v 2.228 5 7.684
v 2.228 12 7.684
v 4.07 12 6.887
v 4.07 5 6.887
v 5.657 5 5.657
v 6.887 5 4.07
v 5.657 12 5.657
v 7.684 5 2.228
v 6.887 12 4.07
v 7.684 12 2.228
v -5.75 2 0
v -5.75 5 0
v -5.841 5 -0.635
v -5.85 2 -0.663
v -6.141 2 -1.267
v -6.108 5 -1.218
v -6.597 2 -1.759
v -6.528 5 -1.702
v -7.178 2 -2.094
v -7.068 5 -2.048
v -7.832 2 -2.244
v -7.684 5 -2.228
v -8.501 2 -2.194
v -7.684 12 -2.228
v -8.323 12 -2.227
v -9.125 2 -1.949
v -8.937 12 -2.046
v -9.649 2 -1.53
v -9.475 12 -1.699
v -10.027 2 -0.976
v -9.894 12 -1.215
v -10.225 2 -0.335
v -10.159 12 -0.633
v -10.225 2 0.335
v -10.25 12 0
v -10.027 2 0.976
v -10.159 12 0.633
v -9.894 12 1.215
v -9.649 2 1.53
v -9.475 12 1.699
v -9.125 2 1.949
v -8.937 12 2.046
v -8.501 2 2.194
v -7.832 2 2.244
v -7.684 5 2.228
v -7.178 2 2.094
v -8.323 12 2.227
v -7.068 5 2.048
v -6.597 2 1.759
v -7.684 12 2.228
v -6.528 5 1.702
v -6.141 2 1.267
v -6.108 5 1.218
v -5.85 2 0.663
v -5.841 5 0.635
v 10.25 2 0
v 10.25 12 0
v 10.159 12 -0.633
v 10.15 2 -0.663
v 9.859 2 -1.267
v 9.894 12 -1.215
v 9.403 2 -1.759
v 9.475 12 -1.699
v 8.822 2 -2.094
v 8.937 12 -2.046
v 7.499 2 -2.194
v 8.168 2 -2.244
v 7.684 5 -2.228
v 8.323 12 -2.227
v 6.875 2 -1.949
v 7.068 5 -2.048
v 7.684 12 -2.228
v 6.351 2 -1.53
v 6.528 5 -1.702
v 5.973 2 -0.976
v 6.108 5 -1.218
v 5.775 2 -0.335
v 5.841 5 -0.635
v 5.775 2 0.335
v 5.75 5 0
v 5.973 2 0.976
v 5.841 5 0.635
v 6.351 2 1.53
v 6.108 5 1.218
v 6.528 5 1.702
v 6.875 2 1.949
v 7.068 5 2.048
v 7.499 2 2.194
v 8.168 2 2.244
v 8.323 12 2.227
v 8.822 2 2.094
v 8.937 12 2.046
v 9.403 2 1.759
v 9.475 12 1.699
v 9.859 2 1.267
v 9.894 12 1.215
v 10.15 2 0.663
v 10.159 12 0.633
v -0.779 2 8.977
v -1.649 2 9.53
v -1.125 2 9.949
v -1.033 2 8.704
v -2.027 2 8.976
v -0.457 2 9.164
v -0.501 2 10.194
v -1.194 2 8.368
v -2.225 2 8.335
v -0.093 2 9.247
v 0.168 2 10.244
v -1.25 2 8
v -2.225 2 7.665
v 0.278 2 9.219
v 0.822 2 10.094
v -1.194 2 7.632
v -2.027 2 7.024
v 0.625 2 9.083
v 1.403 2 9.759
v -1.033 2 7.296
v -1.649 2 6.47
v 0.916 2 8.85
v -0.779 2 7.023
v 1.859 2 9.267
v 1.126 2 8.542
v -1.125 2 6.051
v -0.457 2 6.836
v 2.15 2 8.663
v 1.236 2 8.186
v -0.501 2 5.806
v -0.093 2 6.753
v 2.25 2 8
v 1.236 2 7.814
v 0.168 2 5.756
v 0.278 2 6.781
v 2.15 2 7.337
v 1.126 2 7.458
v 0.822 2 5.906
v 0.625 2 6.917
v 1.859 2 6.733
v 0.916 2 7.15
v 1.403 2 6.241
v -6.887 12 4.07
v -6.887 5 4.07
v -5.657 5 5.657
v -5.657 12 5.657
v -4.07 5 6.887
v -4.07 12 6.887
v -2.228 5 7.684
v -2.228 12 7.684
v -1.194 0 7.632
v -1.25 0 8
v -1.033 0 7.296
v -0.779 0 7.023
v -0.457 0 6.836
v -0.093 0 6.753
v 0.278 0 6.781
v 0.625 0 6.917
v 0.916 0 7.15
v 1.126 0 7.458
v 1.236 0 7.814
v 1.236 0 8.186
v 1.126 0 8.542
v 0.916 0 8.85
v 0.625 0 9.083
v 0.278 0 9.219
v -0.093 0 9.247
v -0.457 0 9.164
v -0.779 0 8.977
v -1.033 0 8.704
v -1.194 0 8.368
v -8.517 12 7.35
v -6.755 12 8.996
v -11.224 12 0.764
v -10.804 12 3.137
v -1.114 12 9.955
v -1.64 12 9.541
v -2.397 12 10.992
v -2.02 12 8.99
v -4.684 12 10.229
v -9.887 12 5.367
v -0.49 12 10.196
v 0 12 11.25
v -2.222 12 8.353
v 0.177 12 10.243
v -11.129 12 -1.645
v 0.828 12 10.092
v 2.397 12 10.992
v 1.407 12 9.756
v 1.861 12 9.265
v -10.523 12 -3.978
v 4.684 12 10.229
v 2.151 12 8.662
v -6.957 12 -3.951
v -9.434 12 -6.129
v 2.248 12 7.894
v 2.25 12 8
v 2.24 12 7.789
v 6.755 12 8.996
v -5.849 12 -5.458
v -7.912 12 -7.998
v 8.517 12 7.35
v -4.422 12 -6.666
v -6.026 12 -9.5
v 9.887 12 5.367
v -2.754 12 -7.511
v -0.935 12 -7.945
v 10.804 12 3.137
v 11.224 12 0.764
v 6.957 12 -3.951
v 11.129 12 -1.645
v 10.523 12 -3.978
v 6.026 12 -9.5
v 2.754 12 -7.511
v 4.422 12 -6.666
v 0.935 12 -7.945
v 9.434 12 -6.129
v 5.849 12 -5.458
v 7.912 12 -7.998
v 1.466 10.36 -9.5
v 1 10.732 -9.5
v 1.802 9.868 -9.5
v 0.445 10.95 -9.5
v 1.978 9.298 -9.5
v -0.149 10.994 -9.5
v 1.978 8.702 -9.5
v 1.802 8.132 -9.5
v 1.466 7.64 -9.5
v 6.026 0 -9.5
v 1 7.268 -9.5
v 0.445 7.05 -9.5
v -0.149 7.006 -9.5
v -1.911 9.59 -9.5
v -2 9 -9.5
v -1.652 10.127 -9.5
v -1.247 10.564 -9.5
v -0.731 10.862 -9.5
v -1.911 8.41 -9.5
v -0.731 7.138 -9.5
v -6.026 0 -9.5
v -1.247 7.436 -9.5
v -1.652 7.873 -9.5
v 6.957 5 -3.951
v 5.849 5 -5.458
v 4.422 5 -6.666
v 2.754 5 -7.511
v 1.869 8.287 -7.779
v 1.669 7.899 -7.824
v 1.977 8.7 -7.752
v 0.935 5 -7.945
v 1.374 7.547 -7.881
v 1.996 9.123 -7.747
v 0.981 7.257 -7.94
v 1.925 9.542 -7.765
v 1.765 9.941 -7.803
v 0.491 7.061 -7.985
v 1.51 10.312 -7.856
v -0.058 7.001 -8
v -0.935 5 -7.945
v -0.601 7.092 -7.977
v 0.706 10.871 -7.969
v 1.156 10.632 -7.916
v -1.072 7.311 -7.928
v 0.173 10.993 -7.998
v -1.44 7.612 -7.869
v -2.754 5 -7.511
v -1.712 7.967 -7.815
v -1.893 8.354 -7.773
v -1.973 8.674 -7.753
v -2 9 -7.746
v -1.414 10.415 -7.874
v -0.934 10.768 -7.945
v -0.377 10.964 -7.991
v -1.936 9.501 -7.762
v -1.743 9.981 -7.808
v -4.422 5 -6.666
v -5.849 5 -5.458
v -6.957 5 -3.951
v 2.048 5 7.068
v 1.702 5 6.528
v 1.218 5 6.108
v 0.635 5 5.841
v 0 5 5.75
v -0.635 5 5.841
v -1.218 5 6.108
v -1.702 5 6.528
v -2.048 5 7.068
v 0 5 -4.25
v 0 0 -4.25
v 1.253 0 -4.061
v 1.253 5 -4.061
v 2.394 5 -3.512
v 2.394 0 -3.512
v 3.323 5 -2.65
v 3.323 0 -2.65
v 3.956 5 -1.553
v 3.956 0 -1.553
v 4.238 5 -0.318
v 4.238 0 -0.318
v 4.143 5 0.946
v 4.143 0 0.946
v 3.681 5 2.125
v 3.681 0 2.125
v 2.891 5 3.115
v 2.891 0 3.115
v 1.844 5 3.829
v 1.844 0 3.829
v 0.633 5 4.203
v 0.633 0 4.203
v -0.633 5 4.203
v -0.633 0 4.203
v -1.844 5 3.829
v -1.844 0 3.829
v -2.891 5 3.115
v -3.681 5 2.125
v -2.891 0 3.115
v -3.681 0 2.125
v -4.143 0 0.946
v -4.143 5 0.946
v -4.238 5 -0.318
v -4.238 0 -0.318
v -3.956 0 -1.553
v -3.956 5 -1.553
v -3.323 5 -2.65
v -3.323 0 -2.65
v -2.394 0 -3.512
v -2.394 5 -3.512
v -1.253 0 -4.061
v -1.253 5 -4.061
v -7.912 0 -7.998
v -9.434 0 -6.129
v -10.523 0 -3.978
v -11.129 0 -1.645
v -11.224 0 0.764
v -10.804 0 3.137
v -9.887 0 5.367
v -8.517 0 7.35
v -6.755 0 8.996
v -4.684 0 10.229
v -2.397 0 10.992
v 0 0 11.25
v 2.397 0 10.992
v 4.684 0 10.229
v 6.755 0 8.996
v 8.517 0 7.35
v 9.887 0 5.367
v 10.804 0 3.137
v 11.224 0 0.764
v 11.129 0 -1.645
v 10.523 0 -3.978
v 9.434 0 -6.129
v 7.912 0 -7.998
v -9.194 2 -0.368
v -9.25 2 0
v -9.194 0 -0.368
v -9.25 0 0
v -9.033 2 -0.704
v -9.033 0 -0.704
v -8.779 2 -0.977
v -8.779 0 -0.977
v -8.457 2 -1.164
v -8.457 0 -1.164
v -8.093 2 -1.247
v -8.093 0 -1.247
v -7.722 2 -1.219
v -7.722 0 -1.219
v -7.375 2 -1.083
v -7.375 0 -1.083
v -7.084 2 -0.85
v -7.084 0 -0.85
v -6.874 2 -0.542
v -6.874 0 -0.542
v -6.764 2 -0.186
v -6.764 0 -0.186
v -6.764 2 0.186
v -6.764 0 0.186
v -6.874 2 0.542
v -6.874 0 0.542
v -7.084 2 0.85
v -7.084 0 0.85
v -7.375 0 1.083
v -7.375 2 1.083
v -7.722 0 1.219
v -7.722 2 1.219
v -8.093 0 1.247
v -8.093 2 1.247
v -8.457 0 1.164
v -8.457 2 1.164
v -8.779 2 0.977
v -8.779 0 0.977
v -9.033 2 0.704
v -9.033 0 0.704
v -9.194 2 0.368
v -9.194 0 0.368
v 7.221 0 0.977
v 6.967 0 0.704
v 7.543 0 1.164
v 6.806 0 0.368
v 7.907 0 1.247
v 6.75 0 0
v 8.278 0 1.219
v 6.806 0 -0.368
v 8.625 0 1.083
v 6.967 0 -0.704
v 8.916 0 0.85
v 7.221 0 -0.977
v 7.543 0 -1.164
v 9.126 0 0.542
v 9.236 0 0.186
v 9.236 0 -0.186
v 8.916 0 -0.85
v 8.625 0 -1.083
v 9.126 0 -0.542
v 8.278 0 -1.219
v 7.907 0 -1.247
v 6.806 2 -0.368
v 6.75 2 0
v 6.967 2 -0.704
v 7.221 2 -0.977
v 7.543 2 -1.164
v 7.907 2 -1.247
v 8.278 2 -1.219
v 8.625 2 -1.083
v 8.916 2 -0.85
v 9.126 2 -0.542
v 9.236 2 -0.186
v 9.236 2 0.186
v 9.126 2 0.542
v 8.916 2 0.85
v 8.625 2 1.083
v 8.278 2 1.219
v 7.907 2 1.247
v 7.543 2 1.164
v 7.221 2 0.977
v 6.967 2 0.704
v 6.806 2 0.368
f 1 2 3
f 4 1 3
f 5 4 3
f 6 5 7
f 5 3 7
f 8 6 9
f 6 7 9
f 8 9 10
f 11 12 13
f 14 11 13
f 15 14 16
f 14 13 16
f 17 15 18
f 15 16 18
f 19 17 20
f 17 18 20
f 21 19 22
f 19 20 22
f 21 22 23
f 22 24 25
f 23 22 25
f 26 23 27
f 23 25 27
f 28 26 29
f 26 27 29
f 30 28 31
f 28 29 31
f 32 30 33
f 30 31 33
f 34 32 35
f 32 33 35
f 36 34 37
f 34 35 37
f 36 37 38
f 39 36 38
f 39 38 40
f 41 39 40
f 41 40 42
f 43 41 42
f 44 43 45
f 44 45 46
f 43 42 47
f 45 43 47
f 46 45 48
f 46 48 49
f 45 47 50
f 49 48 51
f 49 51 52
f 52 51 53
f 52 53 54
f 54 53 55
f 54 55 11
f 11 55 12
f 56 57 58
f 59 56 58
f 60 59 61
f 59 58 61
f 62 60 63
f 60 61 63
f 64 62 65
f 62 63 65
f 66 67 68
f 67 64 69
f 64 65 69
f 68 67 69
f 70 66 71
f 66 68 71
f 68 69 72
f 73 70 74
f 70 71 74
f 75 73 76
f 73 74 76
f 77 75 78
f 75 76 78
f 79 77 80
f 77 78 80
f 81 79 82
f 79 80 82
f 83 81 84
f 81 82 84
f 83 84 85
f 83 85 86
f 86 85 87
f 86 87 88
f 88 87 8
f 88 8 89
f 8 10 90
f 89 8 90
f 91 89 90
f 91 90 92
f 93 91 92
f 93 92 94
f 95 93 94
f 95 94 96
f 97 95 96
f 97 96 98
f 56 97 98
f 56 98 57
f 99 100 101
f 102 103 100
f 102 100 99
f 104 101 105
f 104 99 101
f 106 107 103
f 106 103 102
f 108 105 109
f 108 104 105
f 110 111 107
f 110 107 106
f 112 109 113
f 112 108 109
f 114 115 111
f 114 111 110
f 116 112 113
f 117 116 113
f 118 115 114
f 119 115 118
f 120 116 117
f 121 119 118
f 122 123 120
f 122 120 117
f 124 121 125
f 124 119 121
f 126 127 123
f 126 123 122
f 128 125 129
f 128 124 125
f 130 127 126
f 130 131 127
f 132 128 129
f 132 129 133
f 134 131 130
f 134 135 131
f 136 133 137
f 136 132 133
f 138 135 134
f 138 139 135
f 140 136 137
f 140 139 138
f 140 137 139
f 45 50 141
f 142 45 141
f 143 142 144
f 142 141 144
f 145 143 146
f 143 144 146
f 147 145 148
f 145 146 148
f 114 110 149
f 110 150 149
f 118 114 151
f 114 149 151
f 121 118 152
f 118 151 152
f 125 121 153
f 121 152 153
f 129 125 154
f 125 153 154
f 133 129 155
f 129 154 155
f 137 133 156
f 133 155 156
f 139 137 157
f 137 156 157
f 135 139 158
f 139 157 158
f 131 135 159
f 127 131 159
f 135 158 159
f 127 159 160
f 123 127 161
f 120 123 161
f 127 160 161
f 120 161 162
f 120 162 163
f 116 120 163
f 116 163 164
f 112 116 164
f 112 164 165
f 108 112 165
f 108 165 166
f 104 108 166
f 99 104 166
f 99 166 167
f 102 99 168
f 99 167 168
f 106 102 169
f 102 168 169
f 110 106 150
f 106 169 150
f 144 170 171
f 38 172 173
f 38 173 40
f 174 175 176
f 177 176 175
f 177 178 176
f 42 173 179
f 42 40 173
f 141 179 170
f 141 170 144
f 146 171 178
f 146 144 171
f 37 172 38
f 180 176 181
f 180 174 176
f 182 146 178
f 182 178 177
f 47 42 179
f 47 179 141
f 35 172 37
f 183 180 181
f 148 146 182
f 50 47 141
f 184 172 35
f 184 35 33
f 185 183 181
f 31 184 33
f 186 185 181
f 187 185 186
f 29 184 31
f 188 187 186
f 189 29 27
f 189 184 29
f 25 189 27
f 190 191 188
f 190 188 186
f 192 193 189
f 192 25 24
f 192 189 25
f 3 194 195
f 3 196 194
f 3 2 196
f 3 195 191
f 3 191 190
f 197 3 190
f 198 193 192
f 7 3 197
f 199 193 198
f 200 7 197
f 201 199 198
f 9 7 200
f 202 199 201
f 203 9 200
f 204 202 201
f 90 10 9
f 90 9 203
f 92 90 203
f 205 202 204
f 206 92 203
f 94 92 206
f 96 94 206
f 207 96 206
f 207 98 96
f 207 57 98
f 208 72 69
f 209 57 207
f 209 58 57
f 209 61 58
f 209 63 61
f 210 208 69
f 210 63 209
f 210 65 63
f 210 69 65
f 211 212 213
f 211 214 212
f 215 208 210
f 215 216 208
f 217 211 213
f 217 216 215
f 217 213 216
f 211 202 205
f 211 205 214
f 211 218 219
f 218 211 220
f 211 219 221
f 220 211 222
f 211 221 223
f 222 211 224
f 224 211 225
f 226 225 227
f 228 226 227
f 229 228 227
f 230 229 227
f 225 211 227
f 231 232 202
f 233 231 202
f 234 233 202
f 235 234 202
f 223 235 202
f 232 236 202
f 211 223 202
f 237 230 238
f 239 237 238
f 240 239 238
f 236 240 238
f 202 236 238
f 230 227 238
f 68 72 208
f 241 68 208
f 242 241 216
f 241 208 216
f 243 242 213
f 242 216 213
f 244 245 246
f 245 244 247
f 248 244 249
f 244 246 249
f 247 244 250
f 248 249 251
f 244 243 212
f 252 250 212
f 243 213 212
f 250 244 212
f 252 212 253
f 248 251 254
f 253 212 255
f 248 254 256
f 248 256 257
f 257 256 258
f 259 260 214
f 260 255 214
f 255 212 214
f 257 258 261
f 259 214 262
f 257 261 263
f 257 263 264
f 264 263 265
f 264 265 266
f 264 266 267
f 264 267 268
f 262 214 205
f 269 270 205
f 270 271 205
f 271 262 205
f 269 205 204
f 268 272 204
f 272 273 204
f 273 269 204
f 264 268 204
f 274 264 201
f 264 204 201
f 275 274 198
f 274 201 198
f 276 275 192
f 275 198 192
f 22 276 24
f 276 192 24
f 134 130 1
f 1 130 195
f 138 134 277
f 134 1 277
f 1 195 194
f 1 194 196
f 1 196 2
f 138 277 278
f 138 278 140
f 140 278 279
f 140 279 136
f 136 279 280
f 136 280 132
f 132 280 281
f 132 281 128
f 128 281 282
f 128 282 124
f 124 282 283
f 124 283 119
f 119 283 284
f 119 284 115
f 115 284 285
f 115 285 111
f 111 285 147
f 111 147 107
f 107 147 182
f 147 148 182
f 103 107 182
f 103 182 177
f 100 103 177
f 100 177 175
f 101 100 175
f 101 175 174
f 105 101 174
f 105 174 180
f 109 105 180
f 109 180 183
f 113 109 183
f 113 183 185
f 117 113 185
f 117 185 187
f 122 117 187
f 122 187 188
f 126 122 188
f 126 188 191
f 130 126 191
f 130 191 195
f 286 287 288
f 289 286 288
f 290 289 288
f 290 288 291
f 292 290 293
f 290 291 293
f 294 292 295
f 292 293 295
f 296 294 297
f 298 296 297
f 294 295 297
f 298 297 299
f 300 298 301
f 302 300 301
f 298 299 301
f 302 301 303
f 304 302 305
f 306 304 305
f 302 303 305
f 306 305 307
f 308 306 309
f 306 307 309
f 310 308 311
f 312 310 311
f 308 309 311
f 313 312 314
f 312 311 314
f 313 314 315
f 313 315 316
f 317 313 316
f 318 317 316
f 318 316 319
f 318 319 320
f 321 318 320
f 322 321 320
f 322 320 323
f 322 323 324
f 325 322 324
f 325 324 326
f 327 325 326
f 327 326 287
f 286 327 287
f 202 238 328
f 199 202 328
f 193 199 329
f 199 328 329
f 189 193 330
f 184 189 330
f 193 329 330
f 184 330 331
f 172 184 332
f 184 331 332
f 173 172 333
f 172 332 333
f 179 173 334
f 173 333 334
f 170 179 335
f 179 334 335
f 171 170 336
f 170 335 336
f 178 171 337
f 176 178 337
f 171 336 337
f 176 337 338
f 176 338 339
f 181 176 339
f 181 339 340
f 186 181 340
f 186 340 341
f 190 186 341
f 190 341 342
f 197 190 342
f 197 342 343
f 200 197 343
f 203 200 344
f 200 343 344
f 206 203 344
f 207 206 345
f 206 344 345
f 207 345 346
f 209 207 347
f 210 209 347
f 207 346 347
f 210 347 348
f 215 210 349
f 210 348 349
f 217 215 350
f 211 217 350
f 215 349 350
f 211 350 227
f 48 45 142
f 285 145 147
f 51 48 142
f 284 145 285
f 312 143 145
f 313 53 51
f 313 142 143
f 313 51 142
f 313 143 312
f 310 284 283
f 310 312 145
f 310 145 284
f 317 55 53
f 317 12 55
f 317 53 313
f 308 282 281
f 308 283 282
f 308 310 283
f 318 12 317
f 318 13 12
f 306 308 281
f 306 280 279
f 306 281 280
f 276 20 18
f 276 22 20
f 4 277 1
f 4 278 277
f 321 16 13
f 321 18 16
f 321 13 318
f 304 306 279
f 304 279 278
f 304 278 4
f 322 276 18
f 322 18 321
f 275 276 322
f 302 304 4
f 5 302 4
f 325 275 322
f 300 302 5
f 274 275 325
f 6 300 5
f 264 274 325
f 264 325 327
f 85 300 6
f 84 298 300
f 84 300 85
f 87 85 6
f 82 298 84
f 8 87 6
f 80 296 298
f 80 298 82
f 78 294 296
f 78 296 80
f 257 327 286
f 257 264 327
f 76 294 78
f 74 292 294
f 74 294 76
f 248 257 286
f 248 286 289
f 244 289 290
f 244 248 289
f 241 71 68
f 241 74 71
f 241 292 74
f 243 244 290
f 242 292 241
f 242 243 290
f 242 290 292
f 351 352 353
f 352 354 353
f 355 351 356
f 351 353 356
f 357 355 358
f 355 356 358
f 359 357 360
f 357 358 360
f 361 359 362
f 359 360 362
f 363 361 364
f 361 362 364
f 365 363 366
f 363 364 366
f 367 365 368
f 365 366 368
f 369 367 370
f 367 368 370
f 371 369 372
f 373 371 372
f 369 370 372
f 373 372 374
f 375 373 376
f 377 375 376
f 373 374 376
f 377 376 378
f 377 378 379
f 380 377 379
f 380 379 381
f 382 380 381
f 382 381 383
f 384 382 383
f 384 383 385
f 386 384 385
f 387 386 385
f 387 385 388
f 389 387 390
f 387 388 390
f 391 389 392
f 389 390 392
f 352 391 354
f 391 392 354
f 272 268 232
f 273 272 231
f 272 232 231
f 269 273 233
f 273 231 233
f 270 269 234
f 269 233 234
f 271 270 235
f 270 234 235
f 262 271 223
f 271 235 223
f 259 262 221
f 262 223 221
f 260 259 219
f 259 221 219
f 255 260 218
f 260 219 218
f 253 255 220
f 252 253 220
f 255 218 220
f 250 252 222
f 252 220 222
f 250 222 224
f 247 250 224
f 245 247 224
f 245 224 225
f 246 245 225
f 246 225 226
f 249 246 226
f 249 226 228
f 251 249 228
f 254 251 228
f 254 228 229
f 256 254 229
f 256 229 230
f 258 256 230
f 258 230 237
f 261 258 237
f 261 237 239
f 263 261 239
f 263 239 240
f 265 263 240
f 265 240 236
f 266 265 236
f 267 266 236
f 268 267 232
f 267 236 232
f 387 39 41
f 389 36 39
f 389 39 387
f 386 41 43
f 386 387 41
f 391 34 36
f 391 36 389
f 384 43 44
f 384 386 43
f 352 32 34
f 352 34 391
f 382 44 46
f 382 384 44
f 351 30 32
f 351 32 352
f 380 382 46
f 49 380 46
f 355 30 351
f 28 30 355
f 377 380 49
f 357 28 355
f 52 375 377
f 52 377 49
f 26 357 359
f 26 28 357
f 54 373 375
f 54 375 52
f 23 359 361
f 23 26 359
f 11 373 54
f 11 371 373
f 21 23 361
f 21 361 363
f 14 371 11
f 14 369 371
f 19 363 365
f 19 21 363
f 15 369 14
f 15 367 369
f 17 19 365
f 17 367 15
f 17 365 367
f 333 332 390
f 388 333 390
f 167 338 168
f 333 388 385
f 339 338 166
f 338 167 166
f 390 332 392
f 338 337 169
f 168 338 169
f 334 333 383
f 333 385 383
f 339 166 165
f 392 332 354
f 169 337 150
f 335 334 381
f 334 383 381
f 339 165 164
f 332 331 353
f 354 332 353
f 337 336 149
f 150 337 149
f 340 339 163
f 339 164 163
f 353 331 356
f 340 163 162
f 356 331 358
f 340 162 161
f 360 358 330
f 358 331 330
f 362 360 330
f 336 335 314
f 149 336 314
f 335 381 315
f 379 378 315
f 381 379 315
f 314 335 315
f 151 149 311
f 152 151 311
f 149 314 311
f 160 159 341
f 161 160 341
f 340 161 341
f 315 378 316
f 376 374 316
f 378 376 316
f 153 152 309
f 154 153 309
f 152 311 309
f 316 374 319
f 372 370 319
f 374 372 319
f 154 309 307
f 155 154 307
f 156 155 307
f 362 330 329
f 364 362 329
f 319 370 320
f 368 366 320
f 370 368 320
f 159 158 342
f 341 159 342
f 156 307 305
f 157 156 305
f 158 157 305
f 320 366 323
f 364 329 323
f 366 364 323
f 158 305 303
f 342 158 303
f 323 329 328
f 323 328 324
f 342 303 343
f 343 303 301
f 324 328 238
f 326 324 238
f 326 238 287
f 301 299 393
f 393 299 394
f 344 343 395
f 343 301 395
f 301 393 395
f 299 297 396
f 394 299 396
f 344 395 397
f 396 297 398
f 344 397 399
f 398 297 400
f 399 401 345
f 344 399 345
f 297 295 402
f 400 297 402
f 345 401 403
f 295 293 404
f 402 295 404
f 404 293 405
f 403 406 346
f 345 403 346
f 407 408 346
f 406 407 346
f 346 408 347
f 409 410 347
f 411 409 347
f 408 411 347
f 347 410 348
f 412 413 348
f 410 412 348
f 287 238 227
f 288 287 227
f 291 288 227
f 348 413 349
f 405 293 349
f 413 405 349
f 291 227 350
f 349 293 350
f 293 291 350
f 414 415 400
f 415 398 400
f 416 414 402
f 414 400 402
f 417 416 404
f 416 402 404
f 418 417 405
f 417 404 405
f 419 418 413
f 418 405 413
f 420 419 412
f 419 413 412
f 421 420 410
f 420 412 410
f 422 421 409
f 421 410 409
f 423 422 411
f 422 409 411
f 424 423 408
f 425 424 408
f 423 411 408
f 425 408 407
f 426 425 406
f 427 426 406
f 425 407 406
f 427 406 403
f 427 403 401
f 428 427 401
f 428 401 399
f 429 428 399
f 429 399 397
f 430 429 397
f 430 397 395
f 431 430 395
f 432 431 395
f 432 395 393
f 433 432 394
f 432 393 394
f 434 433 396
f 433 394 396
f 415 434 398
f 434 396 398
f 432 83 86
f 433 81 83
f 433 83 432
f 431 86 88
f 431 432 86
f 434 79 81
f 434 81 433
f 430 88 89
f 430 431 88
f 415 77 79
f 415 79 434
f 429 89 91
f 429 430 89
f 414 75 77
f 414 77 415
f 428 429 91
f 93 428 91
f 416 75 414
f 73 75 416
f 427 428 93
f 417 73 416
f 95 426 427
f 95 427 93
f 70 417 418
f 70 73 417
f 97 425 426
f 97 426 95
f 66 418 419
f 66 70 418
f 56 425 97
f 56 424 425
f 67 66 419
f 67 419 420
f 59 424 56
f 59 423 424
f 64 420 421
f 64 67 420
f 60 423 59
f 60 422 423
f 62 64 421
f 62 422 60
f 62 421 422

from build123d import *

# Parameters (mm, degrees)
BOSS_EXTRU_1_DEPTH                              = 12
CHAMBRAGE_POUR_VIS_T_TE_CYLINDRIQUE_D           = 2.5
CHAMBRAGE_POUR_VIS_T_TE_CYLINDRIQUE_CBORE_D     = 4.5
CHAMBRAGE_POUR_VIS_T_TE_CYLINDRIQUE_CBORE_DEPTH = 10
ESQUISSE12_R                                    = 8
ENL_V_MAT_EXTRU_1_DEPTH                         = 7
ESQUISSE14_R                                    = 2
ENL_V_MAT_EXTRU_2_DEPTH                         = 10
ESQUISSE15_R                                    = 4.25
ENL_V_MAT_EXTRU_3_DEPTH                         = 20.927995444


with BuildPart() as part:
    # Esquisse1 → Boss.-Extru.1 (new body)
    with BuildSketch(Plane(origin=(0, 0, 0), x_dir=(1, 0, 0), z_dir=(0, 1, 0))):
        with BuildLine():
            Line((6.025985397, 9.5), (-6.025985397, 9.5))
            ThreePointArc((-6.025985397, 9.5), (0, -11.25), (6.025985397, 9.5))
        make_face()
    extrude(amount=BOSS_EXTRU_1_DEPTH)

    # Chambrage pour vis à tête cylindrique à 6 pans creux (ou vis CHC) M21 (through all)
    with Locations(Plane(origin=(0, 12, 0), x_dir=(1, 0, 0), z_dir=(0, 1, 0))):
        with Locations((8, 0), (0, -8), (-8, 0)):
            CounterBoreHole(CHAMBRAGE_POUR_VIS_T_TE_CYLINDRIQUE_D / 2, CHAMBRAGE_POUR_VIS_T_TE_CYLINDRIQUE_CBORE_D / 2, CHAMBRAGE_POUR_VIS_T_TE_CYLINDRIQUE_CBORE_DEPTH)

    # Esquisse12 → Enlèv. mat.-Extru.1 (cut)
    with BuildSketch(Plane(origin=(0, 12, 0), x_dir=(1, 0, 0), z_dir=(0, 1, 0))):
        Circle(ESQUISSE12_R)
    extrude(amount=-ENL_V_MAT_EXTRU_1_DEPTH, mode=Mode.SUBTRACT)

    # Esquisse14 → Enlèv. mat.-Extru.2 (cut)
    with BuildSketch(Plane(origin=(0, 0, -9.5), x_dir=(-1, 0, 0), z_dir=(0, 0, -1))):
        with Locations((0, 9)):
            Circle(ESQUISSE14_R)
    extrude(amount=-ENL_V_MAT_EXTRU_2_DEPTH, mode=Mode.SUBTRACT)

    # Esquisse15 → Enlèv. mat.-Extru.3 (cut, through all)
    with BuildSketch(Plane.XZ):
        with Locations(Location((0, 0, 0), (0, 0, 270))):
            Circle(ESQUISSE15_R)
    extrude(amount=-ENL_V_MAT_EXTRU_3_DEPTH, mode=Mode.SUBTRACT)


solid = part.part
